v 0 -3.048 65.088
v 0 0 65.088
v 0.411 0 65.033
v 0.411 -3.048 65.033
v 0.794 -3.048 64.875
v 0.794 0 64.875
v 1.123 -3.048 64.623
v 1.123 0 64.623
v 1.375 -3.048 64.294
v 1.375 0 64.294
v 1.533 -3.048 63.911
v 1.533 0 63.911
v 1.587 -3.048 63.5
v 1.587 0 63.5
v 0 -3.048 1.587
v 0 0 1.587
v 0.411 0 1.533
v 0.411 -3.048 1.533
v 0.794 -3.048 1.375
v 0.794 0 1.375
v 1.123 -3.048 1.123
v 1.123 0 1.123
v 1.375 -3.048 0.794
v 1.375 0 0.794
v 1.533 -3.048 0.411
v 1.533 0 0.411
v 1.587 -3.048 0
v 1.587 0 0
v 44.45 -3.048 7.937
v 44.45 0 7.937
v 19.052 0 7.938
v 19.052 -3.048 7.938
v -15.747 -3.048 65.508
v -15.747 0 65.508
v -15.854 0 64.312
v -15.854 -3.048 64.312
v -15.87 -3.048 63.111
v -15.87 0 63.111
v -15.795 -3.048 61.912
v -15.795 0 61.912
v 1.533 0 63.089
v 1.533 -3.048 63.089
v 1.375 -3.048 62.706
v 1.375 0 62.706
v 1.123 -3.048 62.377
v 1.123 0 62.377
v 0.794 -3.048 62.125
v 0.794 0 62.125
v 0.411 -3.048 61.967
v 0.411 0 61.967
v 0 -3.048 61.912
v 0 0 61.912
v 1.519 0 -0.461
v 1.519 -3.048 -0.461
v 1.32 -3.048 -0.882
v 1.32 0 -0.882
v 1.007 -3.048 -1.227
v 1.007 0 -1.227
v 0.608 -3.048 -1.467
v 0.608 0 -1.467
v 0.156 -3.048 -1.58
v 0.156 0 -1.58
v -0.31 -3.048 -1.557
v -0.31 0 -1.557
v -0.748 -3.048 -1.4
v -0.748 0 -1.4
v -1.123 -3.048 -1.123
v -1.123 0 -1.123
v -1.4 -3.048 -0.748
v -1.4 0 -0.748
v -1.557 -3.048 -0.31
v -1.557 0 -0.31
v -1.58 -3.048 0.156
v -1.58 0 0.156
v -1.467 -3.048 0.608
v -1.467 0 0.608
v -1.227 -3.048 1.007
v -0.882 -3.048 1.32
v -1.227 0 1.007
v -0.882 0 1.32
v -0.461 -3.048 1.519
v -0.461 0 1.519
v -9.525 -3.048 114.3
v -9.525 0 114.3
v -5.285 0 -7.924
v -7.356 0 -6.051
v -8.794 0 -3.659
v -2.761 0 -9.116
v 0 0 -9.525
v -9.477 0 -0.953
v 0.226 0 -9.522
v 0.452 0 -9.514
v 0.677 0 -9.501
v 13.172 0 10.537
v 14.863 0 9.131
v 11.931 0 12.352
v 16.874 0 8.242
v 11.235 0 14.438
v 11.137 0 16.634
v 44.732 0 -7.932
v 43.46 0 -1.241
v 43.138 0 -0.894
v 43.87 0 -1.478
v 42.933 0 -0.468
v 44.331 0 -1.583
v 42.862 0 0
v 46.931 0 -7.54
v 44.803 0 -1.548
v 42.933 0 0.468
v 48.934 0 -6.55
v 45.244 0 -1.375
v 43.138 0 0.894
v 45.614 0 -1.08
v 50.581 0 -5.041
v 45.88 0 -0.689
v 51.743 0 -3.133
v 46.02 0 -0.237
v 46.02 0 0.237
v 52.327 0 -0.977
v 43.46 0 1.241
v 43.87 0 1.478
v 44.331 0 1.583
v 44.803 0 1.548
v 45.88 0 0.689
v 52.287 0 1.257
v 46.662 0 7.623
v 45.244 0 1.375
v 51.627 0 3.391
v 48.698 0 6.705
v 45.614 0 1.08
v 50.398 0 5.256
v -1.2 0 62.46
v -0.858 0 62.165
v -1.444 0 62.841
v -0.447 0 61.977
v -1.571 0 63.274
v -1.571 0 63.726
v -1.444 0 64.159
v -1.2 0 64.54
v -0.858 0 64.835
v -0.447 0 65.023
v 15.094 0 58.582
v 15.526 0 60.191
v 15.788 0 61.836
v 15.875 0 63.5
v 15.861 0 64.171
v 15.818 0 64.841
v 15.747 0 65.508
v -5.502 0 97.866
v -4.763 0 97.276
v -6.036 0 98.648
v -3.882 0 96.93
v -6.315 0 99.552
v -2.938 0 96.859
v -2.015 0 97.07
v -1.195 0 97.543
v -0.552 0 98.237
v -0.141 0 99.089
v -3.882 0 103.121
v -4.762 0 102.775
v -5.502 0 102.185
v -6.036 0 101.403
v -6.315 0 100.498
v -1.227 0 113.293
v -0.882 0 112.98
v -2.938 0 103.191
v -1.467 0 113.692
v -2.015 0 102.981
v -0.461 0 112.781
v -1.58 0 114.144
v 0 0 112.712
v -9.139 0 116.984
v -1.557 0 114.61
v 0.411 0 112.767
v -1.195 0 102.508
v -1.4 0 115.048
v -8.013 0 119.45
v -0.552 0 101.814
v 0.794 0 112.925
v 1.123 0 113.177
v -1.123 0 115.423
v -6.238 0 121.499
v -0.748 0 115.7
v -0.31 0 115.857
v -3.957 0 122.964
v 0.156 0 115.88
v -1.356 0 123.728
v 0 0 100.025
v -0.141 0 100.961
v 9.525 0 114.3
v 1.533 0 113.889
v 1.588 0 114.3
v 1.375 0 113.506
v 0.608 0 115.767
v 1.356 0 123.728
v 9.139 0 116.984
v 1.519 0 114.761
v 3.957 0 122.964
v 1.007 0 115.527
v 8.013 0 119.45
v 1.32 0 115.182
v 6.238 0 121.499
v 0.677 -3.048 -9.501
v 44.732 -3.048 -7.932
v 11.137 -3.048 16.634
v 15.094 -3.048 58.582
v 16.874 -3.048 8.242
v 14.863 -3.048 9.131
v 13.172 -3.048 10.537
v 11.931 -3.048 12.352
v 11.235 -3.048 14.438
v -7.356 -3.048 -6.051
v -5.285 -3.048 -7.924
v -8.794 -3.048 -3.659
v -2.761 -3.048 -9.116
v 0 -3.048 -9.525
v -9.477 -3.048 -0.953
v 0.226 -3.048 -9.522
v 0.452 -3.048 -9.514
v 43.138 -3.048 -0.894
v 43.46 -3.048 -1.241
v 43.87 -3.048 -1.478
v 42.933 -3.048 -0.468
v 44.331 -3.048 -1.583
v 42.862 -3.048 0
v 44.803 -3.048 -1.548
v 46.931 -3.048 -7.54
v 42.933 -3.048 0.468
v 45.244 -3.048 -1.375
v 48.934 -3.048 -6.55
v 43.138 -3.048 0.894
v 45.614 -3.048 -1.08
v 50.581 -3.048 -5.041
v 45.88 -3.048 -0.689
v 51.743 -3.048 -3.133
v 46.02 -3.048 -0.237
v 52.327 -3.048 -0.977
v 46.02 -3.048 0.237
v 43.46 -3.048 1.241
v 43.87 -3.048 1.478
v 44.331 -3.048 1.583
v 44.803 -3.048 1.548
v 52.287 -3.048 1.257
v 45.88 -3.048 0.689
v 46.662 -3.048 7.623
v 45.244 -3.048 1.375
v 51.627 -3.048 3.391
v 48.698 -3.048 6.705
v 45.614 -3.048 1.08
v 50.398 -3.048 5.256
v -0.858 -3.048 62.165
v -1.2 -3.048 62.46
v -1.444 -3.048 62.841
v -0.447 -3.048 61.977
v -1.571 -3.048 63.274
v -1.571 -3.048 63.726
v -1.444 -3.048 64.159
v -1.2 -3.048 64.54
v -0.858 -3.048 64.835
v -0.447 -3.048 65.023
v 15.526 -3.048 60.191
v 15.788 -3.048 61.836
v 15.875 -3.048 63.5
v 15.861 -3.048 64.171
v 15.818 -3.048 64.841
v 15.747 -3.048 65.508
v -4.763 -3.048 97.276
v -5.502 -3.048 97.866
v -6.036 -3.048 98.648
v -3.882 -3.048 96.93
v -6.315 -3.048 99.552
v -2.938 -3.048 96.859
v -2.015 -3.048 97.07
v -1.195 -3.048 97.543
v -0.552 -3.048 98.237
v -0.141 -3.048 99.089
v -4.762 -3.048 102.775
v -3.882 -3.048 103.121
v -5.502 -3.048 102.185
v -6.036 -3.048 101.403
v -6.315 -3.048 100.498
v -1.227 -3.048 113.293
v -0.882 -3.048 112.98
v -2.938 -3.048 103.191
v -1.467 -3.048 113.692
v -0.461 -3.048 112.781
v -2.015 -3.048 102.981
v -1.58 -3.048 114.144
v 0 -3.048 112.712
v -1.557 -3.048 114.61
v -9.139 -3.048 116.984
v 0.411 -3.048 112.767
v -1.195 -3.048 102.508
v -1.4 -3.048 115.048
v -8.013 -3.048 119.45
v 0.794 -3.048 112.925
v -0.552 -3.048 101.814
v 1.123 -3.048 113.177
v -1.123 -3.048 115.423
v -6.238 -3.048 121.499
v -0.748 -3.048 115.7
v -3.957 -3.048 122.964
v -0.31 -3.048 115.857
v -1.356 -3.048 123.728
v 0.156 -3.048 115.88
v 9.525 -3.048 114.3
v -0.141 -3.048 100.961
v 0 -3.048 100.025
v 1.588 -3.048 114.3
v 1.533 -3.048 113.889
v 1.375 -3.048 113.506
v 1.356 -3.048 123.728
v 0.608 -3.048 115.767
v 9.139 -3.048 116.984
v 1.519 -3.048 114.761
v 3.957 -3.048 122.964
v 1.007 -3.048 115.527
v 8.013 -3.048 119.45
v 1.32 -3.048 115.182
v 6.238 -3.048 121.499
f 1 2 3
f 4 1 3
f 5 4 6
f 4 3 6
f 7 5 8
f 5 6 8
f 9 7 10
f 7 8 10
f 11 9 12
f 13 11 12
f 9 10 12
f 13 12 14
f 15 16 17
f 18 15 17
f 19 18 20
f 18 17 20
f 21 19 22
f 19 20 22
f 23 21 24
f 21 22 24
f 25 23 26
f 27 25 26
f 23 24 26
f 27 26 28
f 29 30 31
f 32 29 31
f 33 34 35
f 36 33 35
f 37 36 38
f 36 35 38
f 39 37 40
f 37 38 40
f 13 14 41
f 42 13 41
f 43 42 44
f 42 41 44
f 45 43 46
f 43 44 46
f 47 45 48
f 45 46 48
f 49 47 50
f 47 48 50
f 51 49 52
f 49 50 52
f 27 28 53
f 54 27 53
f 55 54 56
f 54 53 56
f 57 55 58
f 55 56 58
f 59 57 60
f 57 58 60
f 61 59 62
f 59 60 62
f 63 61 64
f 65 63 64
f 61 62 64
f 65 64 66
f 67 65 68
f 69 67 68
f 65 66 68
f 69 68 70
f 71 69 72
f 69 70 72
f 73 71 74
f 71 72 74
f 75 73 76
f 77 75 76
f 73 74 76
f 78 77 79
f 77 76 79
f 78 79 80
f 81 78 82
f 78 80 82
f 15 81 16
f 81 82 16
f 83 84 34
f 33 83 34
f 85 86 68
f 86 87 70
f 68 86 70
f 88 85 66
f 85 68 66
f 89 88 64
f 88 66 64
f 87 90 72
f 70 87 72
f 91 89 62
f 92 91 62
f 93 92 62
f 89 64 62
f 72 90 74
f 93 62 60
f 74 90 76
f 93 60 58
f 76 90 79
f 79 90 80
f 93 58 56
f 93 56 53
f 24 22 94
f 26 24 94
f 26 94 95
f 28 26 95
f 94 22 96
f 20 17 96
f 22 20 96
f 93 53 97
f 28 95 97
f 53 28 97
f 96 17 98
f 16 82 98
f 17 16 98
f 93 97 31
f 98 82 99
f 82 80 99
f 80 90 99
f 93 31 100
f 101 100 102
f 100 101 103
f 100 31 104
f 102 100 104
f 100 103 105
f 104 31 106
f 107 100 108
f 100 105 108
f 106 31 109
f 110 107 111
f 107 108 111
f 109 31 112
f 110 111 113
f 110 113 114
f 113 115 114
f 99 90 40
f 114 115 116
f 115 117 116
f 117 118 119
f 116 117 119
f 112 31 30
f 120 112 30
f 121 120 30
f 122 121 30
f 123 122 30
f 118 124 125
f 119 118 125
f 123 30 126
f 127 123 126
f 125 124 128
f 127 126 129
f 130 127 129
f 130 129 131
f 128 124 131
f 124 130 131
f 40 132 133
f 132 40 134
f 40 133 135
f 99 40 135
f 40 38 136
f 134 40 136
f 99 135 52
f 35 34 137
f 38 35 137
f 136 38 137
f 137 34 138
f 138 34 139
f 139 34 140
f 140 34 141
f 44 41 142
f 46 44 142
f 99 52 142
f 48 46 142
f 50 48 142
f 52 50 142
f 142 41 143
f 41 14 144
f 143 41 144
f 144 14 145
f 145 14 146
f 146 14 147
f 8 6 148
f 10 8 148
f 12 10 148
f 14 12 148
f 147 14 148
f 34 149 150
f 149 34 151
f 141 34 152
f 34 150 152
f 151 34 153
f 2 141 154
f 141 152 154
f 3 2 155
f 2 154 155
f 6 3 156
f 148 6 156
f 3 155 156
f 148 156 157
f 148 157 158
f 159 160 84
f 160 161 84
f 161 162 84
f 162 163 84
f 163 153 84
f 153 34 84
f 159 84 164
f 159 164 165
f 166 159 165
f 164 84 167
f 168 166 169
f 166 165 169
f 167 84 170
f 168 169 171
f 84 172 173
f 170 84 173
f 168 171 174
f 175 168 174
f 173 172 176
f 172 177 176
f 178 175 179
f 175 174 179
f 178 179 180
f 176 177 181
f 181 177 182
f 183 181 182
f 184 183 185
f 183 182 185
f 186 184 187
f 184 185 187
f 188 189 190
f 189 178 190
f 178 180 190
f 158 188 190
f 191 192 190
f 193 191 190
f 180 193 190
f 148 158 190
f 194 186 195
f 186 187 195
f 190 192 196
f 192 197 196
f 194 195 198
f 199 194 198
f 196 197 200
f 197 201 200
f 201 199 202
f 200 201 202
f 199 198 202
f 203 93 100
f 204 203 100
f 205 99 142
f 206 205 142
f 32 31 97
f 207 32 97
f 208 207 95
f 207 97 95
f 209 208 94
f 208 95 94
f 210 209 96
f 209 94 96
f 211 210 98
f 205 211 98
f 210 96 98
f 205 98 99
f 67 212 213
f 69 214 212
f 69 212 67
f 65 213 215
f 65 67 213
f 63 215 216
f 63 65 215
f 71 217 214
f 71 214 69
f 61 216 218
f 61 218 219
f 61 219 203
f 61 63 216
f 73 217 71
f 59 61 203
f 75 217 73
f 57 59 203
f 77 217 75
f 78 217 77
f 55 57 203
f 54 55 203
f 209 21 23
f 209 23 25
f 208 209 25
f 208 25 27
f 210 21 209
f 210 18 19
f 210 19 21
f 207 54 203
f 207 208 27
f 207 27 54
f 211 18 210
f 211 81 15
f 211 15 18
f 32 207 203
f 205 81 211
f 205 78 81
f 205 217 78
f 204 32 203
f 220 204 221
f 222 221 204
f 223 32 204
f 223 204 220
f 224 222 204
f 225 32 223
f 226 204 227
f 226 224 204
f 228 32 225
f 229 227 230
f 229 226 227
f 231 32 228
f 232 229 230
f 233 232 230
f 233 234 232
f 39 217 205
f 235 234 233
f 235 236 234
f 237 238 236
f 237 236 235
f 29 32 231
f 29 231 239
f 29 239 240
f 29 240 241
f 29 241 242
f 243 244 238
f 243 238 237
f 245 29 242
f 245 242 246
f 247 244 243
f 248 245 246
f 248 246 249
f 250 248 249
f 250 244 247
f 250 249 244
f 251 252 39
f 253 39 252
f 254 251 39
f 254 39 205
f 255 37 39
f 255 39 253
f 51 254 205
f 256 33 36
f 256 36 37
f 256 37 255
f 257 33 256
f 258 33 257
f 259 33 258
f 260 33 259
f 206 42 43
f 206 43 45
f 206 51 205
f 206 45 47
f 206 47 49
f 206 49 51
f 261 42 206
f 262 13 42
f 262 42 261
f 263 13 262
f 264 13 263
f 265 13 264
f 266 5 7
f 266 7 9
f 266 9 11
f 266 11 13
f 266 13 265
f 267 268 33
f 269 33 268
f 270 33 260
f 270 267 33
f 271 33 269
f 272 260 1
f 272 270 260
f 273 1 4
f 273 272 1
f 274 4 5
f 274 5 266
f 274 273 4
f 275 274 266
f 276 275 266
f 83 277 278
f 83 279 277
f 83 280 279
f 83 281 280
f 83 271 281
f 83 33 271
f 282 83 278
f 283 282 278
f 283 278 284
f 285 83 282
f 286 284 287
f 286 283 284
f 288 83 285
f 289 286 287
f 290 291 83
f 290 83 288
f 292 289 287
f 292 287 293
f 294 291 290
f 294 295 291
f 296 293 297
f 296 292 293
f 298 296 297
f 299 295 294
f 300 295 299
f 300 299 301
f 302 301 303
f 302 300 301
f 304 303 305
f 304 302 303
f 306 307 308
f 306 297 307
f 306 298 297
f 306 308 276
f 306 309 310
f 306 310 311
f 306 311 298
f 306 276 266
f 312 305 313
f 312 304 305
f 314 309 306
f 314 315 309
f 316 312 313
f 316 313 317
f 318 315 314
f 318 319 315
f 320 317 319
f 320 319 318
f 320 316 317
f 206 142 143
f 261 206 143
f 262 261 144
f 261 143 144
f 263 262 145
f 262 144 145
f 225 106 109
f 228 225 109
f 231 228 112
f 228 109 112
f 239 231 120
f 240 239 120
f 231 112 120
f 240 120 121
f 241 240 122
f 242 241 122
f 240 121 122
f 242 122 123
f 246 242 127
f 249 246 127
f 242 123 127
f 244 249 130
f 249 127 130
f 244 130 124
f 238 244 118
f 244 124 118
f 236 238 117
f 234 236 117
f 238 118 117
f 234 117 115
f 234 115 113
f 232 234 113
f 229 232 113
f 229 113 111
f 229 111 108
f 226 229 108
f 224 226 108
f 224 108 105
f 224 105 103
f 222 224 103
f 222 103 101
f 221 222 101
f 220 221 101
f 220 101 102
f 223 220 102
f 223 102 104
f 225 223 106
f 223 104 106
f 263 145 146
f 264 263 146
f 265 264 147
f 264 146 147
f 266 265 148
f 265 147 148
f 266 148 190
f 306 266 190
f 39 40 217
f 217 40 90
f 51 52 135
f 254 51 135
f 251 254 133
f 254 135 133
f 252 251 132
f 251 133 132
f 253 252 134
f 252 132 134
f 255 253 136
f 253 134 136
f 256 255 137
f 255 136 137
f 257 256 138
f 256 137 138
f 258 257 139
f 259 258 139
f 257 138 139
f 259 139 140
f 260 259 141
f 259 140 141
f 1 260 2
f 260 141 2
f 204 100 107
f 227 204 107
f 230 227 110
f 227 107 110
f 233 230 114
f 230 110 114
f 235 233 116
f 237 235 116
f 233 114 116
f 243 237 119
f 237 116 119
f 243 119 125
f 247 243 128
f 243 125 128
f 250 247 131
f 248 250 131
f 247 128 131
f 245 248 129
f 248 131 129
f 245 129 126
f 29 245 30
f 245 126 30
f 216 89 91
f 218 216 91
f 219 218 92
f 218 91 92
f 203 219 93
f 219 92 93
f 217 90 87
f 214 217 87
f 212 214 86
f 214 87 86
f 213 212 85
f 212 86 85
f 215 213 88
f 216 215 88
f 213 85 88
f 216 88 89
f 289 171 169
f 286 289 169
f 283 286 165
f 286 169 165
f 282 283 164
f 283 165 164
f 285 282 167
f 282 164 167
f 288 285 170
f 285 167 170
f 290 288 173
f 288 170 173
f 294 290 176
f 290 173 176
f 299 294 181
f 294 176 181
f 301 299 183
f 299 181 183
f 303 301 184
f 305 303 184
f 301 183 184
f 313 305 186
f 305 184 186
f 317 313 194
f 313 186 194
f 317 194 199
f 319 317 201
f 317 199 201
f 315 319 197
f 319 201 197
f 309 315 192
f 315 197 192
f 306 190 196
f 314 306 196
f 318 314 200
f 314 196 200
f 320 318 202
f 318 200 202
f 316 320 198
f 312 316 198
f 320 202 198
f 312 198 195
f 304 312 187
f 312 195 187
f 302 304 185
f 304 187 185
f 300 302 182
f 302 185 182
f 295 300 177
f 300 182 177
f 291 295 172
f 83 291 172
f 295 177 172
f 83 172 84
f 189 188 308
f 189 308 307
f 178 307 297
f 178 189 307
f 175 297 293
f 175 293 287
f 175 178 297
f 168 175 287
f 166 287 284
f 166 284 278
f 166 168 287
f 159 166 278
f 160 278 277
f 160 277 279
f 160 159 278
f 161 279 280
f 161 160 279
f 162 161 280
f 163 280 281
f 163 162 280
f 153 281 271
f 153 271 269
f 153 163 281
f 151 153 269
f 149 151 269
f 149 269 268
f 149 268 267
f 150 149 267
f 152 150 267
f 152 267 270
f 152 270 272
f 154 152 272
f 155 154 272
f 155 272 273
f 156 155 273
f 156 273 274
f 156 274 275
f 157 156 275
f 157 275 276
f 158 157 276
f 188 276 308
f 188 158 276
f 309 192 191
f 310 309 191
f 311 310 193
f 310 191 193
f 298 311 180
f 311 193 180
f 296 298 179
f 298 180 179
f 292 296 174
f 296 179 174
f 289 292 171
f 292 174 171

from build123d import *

# Parameters (mm, degrees)
F0_R     = 3.175
F1_DEPTH = 3.048


with BuildPart() as f1:
    # F0 (on Front) → F1 (new body)
    with BuildSketch(Plane.XZ):
        with BuildLine():
            ThreePointArc((1.5875, 0), (-1.1225320151, -1.1225320151), (0, 1.5875))
            Line((0, 1.5875), (0, 9.525))
            ThreePointArc((0, 9.525), (-7.063929059, 6.3895642457), (-9.4772553384, -0.9525))
            ThreePointArc((-9.4772553384, -0.9525), (-6.3895642457, -7.063929059), (0, -9.525))
            Line((0, -9.525), (0.6773435479, -9.500885786))
            ThreePointArc((0.6773435479, -9.500885786), (6.9705567315, -6.4912990883), (9.525, 0))
            Line((9.525, 0), (1.5875, 0))
        make_face()
        with BuildLine():
            ThreePointArc((-9.4772553384, -0.9525), (-7.063929059, 6.3895642457), (0, 9.525))
            Line((0, 9.525), (0, 47.625))
            ThreePointArc((0, 47.625), (-10.6492737428, 51.7267849017), (-15.7954255641, 61.9125))
            Line((-15.7954255641, 61.9125), (-9.4772553384, -0.9525))
        make_face()
        with BuildLine():
            Line((0, 47.625), (0, 9.525))
            ThreePointArc((0, 9.525), (6.7351920908, 6.7351920908), (9.525, 0))
            Line((9.525, 0), (36.5125, 0))
            ThreePointArc((36.5125, 0), (38.8373399243, 5.6126600757), (44.45, 7.9375))
            Line((44.45, 7.9375), (19.0516679685, 7.9375))
            ThreePointArc((19.0516679685, 7.9375), (13.1719464369, 10.5365735064), (11.1366133377, 16.6344196472))
            Line((11.1366133377, 16.6344196472), (15.0940259351, 58.5820729906))
            ThreePointArc((15.0940259351, 58.5820729906), (9.3258654753, 50.6530603591), (0, 47.625))
        make_face()
        with BuildLine():
            Line((36.5125, 0), (9.525, 0))
            ThreePointArc((9.525, 0), (6.9705567315, -6.4912990883), (0.6773435479, -9.500885786))
            Line((0.6773435479, -9.500885786), (44.7324052746, -7.9324746146))
            ThreePointArc((44.7324052746, -7.9324746146), (38.9380895153, -5.7116327839), (36.5125, 0))
        make_face()
        with BuildLine():
            ThreePointArc((-15.7954255641, 61.9125), (-10.6492737428, 51.7267849017), (0, 47.625))
            Line((0, 47.625), (0, 61.9125))
            ThreePointArc((0, 61.9125), (-1.5875, 63.5), (0, 65.0875))
            Line((0, 65.0875), (0, 79.375))
            ThreePointArc((0, 79.375), (-10.4912828548, 75.4142187767), (-15.7474569047, 65.5082893304))
            ThreePointArc((-15.7474569047, 65.5082893304), (-15.8735876171, 63.7117573215), (-15.7954255641, 61.9125))
        make_face()
        with BuildLine():
            Line((0, 61.9125), (0, 47.625))
            ThreePointArc((0, 47.625), (9.3258654753, 50.6530603591), (15.0940259351, 58.5820729906))
            Line((15.0940259351, 58.5820729906), (15.7474569047, 65.5082893304))
            ThreePointArc((15.7474569047, 65.5082893304), (10.4912828548, 75.4142187767), (0, 79.375))
            Line((0, 79.375), (0, 65.0875))
            ThreePointArc((0, 65.0875), (1.1225320151, 64.6225320151), (1.5875, 63.5))
            ThreePointArc((1.5875, 63.5), (1.1225320151, 62.3774679849), (0, 61.9125))
        make_face()
        with BuildLine():
            ThreePointArc((44.45, 7.9375), (38.8373399243, 5.6126600757), (36.5125, 0))
            ThreePointArc((36.5125, 0), (38.9380895153, -5.7116327839), (44.7324052746, -7.9324746146))
            ThreePointArc((44.7324052746, -7.9324746146), (50.1616327839, -5.5119104847), (52.3875, 0))
            ThreePointArc((52.3875, 0), (50.0626600757, 5.6126600757), (44.45, 7.9375))
        make_face()
        with BuildLine():
            ThreePointArc((46.0375, 0), (44.45, -1.5875), (42.8625, 0))
            ThreePointArc((42.8625, 0), (44.45, 1.5875), (46.0375, 0))
        make_face(mode=Mode.SUBTRACT)
        with BuildLine():
            ThreePointArc((0, -9.525), (0.3388863295, -9.5189695375), (0.6773435479, -9.500885786))
            Line((0.6773435479, -9.500885786), (0, -9.525))
        make_face()
        with BuildLine():
            Line((15.7474569047, 65.5082893304), (15.0940259351, 58.5820729906))
            ThreePointArc((15.0940259351, 58.5820729906), (15.6785408556, 61.0102245804), (15.875, 63.5))
            ThreePointArc((15.875, 63.5), (15.8430821396, 64.5061676396), (15.7474569047, 65.5082893304))
        make_face()
        with BuildLine():
            Line((-9.525, 114.3), (-15.7474569047, 65.5082893304))
            ThreePointArc((-15.7474569047, 65.5082893304), (-10.4912828548, 75.4142187767), (0, 79.375))
            Line((0, 79.375), (0, 100.0252))
            Line((0, 100.0252), (0, 104.775))
            ThreePointArc((0, 104.775), (-6.7351920908, 107.5648079092), (-9.525, 114.3))
        make_face()
        with Locations((-3.175, 100.0252)):
            Circle(F0_R, mode=Mode.SUBTRACT)
        with BuildLine():
            ThreePointArc((0, 79.375), (10.4912828548, 75.4142187767), (15.7474569047, 65.5082893304))
            Line((15.7474569047, 65.5082893304), (9.525, 114.3))
            ThreePointArc((9.525, 114.3), (6.7351920908, 107.5648079092), (0, 104.775))
            Line((0, 104.775), (0, 100.0252))
            Line((0, 100.0252), (0, 79.375))
        make_face()
        with BuildLine():
            ThreePointArc((9.525, 114.3), (0, 123.825), (-9.525, 114.3))
            ThreePointArc((-9.525, 114.3), (-6.7351920908, 107.5648079092), (0, 104.775))
            ThreePointArc((0, 104.775), (6.7351920908, 107.5648079092), (9.525, 114.3))
        make_face()
        with BuildLine():
            ThreePointArc((1.5875, 114.3), (1.1225320151, 113.1774679849), (0, 112.7125))
            ThreePointArc((0, 112.7125), (-1.1225320151, 115.4225320151), (1.5875, 114.3))
        make_face(mode=Mode.SUBTRACT)
        with BuildLine():
            Line((0, 9.525), (0, 1.5875))
            ThreePointArc((0, 1.5875), (1.1225320151, 1.1225320151), (1.5875, 0))
            Line((1.5875, 0), (9.525, 0))
            ThreePointArc((9.525, 0), (6.7351920908, 6.7351920908), (0, 9.525))
        make_face()
    extrude(amount=F1_DEPTH)


solid = f1.part
